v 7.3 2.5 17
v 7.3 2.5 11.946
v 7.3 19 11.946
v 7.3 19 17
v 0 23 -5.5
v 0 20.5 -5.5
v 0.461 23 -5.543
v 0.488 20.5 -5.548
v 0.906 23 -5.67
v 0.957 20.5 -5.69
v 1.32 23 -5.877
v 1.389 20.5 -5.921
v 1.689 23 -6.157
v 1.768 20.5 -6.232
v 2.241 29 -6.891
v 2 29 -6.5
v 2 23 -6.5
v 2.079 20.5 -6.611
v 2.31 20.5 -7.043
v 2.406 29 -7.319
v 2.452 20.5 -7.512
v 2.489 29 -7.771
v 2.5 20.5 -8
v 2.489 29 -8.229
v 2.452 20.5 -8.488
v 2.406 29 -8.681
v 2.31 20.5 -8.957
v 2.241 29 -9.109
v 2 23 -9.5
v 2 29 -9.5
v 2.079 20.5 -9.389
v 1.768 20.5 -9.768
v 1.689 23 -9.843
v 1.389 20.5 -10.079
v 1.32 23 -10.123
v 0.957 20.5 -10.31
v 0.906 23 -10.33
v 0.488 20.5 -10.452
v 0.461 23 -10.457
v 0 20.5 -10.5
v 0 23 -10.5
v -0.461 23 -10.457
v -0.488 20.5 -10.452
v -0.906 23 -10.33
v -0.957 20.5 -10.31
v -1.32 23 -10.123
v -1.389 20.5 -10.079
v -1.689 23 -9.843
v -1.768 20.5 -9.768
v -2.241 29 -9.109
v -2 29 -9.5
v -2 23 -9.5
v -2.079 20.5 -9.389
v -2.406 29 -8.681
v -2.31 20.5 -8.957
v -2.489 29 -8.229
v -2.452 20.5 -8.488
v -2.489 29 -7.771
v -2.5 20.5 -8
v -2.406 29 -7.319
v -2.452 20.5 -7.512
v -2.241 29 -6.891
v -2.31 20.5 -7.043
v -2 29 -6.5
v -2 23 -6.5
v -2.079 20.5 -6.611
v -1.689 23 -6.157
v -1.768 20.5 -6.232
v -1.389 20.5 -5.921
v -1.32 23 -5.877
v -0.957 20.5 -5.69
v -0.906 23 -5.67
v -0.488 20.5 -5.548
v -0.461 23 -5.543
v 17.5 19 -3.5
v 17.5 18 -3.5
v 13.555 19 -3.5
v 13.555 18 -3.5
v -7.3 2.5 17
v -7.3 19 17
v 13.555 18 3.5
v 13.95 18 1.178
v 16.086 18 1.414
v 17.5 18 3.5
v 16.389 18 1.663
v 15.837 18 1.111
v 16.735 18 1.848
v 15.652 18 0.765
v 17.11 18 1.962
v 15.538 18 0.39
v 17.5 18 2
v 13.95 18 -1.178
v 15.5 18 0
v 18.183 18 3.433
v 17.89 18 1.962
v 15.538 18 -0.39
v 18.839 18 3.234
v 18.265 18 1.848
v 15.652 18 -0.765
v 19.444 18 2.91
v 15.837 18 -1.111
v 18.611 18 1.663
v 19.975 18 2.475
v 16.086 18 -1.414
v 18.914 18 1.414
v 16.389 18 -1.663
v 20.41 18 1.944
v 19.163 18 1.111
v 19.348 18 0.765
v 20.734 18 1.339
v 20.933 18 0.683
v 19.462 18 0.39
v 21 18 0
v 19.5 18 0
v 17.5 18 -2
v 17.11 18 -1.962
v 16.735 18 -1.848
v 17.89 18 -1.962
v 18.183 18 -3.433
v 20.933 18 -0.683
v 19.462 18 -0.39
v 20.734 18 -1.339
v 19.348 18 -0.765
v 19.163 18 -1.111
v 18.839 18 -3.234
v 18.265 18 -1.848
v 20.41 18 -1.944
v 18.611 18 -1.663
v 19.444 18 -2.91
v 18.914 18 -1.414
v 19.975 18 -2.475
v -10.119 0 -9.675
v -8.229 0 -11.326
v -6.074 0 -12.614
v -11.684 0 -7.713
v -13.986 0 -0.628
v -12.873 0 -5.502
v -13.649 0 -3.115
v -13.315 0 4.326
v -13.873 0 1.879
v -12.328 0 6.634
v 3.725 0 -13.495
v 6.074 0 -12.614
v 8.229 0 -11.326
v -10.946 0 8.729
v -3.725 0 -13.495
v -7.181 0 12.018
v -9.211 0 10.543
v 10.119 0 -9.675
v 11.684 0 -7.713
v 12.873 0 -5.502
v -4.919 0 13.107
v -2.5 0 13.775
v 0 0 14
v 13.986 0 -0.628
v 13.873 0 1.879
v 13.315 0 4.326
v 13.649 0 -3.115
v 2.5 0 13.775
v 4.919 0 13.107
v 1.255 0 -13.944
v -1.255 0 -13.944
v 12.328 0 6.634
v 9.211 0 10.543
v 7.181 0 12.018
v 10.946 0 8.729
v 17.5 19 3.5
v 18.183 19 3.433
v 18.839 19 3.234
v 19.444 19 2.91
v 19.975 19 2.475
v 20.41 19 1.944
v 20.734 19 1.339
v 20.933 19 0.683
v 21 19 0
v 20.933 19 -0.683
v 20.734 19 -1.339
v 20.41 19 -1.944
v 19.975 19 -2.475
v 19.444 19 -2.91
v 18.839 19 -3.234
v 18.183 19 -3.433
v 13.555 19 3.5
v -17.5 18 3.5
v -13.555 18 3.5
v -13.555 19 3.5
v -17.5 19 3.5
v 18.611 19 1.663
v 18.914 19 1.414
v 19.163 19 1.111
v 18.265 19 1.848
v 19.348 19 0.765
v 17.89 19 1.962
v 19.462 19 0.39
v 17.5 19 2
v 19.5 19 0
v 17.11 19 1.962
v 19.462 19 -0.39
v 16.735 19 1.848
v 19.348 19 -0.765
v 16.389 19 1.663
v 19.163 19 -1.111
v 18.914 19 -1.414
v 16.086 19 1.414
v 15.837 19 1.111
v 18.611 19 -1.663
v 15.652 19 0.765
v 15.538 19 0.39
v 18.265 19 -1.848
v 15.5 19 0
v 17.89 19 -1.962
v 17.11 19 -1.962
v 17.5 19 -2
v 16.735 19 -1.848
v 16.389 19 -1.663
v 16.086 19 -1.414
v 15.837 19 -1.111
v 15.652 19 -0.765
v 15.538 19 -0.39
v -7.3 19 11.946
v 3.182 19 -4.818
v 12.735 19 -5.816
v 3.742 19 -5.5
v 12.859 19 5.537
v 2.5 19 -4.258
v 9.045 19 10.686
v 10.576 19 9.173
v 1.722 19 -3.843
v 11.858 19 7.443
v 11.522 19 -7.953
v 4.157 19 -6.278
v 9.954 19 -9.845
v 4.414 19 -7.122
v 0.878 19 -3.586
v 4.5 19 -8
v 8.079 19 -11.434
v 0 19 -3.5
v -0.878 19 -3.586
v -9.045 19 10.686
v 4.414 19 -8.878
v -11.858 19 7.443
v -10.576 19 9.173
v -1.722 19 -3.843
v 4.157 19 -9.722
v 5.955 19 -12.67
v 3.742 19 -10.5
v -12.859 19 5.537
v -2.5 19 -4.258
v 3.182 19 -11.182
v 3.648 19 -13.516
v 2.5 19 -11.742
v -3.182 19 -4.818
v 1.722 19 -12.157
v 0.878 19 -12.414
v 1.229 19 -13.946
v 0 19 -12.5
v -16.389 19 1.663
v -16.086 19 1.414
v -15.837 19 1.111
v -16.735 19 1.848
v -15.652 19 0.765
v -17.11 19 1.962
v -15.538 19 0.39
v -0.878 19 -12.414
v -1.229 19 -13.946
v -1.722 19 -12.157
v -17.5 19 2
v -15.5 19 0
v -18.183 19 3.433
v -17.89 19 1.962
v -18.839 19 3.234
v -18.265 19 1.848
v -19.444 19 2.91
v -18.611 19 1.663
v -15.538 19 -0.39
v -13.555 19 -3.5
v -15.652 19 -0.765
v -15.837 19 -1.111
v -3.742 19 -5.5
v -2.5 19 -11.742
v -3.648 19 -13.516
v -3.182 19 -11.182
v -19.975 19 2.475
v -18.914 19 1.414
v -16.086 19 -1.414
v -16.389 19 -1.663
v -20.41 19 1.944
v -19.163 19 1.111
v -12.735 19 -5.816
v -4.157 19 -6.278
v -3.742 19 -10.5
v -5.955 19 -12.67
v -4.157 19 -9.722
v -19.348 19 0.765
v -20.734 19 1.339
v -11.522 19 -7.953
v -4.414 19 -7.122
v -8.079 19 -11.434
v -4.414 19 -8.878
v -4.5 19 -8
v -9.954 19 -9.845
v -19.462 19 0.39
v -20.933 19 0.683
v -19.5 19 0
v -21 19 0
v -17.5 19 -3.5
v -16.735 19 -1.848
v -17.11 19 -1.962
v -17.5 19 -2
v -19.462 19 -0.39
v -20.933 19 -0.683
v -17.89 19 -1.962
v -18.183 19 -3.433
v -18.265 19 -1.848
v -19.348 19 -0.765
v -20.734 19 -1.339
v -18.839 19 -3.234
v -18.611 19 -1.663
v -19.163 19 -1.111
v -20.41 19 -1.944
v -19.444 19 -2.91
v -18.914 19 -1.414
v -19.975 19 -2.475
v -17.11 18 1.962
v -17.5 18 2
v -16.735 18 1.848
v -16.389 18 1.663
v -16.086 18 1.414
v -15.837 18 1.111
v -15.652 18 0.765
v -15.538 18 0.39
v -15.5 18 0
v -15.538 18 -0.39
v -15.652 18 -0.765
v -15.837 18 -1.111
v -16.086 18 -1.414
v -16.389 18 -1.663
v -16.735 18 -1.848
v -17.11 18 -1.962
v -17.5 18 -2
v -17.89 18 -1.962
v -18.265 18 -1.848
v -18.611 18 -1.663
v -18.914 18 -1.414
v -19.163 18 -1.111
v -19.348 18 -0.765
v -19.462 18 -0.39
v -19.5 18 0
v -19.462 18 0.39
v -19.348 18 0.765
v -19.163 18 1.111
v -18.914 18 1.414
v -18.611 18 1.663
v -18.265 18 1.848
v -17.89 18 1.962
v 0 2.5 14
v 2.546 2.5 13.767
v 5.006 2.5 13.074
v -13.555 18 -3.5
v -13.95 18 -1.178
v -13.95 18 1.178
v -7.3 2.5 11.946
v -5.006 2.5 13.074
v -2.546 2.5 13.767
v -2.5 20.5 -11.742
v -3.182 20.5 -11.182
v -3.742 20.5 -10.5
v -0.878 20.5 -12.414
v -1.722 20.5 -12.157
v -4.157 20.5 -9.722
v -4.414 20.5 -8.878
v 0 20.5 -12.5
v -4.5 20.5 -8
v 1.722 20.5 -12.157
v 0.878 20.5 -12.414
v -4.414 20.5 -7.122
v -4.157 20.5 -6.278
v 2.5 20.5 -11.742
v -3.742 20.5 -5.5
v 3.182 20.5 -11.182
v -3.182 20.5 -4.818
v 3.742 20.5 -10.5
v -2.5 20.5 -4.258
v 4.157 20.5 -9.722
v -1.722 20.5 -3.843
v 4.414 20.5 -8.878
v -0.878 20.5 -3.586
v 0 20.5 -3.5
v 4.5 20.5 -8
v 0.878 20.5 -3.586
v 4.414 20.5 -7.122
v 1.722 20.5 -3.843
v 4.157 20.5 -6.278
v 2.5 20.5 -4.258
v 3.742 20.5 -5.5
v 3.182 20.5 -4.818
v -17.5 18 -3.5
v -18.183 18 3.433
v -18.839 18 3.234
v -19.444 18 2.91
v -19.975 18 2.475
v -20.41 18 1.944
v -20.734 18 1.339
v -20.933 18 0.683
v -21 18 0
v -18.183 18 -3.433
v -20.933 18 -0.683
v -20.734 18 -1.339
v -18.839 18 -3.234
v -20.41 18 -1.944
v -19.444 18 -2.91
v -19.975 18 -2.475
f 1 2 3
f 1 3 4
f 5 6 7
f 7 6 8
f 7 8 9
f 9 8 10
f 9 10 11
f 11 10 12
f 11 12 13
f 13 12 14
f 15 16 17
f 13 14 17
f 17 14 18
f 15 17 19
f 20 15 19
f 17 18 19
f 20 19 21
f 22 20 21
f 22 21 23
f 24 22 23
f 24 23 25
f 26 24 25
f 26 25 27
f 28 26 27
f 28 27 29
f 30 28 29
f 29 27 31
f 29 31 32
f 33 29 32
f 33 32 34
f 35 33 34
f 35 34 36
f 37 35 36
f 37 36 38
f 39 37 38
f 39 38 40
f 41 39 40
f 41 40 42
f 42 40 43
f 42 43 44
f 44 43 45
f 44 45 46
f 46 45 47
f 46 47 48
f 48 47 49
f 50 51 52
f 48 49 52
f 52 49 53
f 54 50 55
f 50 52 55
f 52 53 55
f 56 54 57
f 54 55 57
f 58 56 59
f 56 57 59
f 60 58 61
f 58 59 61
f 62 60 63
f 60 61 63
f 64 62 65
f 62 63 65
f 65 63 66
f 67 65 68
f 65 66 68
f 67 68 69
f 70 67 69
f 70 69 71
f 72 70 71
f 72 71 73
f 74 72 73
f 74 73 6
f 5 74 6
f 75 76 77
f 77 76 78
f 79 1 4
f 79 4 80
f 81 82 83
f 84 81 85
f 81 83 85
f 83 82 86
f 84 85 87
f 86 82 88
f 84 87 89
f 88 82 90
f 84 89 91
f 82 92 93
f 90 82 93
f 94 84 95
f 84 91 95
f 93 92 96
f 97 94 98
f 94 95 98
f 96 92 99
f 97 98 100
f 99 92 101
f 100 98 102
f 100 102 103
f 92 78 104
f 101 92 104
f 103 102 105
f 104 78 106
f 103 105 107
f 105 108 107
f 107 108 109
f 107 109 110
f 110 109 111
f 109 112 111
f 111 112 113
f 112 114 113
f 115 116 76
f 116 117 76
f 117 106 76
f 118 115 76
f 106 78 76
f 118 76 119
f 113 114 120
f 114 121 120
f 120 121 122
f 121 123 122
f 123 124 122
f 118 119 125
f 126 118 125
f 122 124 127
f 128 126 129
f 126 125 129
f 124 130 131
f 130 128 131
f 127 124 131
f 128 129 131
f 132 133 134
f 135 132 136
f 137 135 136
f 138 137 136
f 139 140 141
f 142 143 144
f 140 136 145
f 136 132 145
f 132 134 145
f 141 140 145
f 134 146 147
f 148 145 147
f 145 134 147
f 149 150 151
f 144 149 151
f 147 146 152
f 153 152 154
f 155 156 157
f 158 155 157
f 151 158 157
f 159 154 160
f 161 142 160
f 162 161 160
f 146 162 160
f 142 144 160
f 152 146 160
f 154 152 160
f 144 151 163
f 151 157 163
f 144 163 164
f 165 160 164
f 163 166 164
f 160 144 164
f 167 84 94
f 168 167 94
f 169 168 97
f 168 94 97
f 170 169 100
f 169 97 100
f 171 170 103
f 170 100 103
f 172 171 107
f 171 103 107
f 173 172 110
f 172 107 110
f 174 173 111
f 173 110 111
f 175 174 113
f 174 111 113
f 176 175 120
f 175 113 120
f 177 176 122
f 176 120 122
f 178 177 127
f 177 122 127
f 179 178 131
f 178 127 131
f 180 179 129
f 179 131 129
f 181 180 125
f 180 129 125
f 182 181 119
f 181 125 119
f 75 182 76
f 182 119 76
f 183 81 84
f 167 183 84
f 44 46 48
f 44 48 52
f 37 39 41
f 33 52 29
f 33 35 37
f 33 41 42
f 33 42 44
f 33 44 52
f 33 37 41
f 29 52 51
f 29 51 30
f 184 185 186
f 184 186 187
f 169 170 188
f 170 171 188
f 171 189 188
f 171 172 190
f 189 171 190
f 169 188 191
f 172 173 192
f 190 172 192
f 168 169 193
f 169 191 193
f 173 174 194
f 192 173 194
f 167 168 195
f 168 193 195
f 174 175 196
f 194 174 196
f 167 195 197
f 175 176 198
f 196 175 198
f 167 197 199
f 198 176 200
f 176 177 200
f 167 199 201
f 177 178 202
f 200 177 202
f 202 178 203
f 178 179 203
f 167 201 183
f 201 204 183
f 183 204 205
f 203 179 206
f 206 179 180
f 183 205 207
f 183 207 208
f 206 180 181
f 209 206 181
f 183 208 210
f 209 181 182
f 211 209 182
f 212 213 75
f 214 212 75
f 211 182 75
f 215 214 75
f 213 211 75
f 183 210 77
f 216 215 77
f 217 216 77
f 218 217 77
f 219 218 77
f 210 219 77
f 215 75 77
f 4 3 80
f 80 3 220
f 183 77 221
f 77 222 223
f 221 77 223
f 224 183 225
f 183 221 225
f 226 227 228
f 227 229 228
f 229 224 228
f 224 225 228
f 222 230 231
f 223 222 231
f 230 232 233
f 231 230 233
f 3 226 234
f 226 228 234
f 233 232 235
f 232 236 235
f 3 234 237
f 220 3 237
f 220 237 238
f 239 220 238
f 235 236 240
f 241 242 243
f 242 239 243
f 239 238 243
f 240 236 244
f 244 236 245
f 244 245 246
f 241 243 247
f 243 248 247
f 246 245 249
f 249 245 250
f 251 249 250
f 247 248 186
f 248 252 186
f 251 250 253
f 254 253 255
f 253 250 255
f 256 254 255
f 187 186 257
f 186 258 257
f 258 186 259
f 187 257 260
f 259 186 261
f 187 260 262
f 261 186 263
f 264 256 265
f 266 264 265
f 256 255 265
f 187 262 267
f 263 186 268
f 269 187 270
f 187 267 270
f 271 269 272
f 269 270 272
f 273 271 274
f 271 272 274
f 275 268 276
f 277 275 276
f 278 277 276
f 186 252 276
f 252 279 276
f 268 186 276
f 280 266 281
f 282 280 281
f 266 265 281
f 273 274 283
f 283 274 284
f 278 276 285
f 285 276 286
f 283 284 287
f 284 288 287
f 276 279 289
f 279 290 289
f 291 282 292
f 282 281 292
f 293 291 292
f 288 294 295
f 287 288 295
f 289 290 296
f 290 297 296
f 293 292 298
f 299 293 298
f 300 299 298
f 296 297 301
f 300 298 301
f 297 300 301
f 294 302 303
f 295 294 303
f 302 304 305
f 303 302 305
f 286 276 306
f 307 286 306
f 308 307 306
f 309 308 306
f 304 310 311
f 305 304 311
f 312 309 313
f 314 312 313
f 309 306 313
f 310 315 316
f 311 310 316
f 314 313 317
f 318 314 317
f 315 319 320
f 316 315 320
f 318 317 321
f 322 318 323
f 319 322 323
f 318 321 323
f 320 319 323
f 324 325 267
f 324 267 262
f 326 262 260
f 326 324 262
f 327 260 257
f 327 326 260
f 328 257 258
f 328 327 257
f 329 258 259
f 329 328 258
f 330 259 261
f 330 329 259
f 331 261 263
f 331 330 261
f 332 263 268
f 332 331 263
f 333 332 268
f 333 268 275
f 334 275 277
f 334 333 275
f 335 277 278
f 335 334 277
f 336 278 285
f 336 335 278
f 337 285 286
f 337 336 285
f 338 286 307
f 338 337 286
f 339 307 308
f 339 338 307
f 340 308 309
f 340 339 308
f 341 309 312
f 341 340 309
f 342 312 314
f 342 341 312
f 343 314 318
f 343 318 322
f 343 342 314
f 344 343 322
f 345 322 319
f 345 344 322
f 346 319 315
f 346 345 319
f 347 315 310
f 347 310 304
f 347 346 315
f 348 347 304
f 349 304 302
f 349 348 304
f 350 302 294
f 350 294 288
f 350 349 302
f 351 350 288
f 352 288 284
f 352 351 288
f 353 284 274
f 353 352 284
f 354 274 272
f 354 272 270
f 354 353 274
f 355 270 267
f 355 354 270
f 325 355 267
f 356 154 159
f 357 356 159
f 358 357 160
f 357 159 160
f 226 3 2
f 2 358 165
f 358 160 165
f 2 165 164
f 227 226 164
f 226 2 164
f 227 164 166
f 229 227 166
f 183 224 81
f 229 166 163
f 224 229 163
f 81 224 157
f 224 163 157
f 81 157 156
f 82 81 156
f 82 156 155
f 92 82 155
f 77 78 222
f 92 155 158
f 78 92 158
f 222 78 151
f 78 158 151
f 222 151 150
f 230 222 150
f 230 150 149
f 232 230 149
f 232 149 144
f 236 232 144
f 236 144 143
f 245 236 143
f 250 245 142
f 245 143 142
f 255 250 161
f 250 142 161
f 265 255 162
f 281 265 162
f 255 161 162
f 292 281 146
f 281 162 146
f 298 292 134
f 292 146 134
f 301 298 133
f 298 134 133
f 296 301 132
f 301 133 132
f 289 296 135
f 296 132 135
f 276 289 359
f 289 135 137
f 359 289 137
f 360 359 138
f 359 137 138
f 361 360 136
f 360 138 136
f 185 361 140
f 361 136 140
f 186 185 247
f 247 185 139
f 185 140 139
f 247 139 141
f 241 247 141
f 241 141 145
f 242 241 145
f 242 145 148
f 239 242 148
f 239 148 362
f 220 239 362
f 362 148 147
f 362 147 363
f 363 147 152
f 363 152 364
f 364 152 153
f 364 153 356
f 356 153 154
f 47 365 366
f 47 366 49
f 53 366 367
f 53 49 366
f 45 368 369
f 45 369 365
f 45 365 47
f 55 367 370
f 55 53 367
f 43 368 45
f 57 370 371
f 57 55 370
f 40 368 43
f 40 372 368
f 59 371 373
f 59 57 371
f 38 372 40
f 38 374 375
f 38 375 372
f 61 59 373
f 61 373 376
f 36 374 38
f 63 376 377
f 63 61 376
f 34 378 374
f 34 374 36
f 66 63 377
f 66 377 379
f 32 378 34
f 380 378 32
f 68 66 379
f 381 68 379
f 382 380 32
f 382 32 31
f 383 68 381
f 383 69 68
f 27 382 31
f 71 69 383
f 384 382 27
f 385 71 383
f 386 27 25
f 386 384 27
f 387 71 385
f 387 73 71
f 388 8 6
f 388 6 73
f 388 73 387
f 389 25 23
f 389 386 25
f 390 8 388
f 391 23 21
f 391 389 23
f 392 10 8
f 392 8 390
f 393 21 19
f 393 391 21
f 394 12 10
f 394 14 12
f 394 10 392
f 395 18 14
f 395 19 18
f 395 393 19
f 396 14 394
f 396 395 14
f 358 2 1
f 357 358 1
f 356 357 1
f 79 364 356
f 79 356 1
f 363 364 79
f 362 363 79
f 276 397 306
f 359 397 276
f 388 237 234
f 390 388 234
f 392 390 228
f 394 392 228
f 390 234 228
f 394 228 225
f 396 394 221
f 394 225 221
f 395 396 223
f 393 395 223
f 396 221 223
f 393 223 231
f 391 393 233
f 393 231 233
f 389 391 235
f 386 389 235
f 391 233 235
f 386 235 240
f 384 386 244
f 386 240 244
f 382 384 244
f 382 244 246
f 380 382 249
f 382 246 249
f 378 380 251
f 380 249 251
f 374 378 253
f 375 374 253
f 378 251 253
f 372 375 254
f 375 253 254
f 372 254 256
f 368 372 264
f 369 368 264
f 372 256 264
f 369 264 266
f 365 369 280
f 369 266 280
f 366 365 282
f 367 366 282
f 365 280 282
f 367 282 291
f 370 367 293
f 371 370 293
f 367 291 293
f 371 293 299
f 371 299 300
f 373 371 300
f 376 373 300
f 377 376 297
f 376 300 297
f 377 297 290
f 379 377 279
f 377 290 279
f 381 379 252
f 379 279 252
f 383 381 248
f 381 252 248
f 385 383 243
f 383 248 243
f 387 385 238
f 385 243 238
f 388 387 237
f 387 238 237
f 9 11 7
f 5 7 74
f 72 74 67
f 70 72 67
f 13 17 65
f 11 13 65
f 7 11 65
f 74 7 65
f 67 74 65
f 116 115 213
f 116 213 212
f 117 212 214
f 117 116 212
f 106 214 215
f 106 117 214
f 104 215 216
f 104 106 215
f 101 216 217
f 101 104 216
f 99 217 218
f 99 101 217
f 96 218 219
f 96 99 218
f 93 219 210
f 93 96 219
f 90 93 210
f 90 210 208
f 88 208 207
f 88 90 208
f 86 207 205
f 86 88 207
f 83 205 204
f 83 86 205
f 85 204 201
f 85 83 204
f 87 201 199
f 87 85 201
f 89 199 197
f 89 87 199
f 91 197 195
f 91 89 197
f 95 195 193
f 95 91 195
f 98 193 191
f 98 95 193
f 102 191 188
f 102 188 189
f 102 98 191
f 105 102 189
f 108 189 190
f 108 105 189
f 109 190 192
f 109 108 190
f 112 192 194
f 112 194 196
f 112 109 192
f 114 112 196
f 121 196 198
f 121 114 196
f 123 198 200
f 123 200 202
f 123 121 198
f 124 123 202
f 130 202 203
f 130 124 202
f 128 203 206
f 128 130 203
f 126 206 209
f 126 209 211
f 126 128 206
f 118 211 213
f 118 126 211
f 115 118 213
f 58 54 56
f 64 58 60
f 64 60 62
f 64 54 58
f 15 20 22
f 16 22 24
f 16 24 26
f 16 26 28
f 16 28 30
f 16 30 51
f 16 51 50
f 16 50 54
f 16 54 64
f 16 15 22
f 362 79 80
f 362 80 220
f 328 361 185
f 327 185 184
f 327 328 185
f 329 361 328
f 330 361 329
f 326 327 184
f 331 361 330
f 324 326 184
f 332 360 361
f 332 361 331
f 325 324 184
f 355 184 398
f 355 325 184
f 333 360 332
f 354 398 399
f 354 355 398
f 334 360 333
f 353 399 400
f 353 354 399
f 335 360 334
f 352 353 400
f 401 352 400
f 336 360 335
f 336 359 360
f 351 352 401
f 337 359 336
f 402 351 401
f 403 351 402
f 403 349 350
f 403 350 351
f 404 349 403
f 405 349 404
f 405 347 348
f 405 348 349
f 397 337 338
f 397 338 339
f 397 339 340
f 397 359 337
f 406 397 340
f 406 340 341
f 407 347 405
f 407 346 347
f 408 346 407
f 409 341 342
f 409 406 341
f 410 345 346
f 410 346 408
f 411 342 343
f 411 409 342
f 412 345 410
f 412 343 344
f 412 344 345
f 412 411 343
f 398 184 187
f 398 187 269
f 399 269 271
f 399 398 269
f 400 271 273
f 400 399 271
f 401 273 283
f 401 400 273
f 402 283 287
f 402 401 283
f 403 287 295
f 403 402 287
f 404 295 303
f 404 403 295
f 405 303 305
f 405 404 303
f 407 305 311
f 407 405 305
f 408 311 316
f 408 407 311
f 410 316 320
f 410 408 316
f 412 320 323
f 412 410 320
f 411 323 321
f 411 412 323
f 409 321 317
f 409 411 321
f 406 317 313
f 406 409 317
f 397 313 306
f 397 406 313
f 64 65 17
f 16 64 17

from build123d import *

# Parameters (mm, degrees)
SKETCH_1_R          = 14
EXTRUDE_1_DEPTH     = 19
SKETCH_2_R          = 4.5
EXTRUDE_2_DEPTH     = 1.5
SKETCH_3_R          = 2.5
EXTRUDE_3_DEPTH     = 8.5
CUT_EXTRUDE_START   = -6
CUT_EXTRUDE_1_DEPTH = 6
EXTRUDE_START       = -1
SKETCH_5_R          = 2
EXTRUDE_4_DEPTH     = 1
EXTRUDE_START_2     = -16.5
EXTRUDE_5_DEPTH     = 16.5


with BuildPart() as part:
    # Эскиз1 → Бобышка-Вытянуть1 (new body)
    with BuildSketch(Plane(origin=(0, 0, 0), x_dir=(1, 0, 0), z_dir=(0, 1, 0))):
        with Locations(Location((0, 0, 0), (0, 0, 270))):
            Circle(SKETCH_1_R)
    extrude(amount=EXTRUDE_1_DEPTH)

    # Эскиз2 → Бобышка-Вытянуть2 (add)
    with BuildSketch(Plane(origin=(0, 19, 0), x_dir=(1, 0, 0), z_dir=(0, 1, 0))):
        with Locations(Location((0, 8, 0), (0, 0, 270))):
            Circle(SKETCH_2_R)
    extrude(amount=EXTRUDE_2_DEPTH)

    # Эскиз3 → Бобышка-Вытянуть3 (add)
    with BuildSketch(Plane(origin=(0, 20.5, 0), x_dir=(1, 0, 0), z_dir=(0, 1, 0))):
        with Locations(Location((0, 8, 0), (0, 0, 270))):
            Circle(SKETCH_3_R)
    extrude(amount=EXTRUDE_3_DEPTH)

    # Эскиз4 → Вырез-Вытянуть1 (cut)
    with BuildSketch(Plane(origin=(0, 29, 0), x_dir=(1, 0, 0), z_dir=(0, 1, 0)).offset(CUT_EXTRUDE_START)):
        with BuildLine():
            Line((-2, 9.5), (2, 9.5))
            ThreePointArc((2, 9.5), (0, 10.5), (-2, 9.5))
        make_face()
        with BuildLine():
            Line((-2, 6.5), (2, 6.5))
            ThreePointArc((2, 6.5), (0, 5.5), (-2, 6.5))
        make_face()
    extrude(amount=CUT_EXTRUDE_1_DEPTH, mode=Mode.SUBTRACT)

    # Эскиз5 → Бобышка-Вытянуть4 (add)
    # profile 1 of 2: a face of its own
    with BuildSketch(Plane(origin=(0, 19, 0), x_dir=(1, 0, 0), z_dir=(0, 1, 0)).offset(EXTRUDE_START)):
        with BuildLine():
            Line((-17.5, 3.5), (-13.555441712, 3.5))
            ThreePointArc((-13.555441712, 3.5), (-14, 0), (-13.555441712, -3.5))
            Line((-13.555441712, -3.5), (-17.5, -3.5))
            ThreePointArc((-17.5, -3.5), (-21, 0), (-17.5, 3.5))
        make_face()
        with Locations(Location((-17.5, 0, 0), (0, 0, 270))):
            Circle(SKETCH_5_R, mode=Mode.SUBTRACT)
    # profile 2 of 2: a face of its own
    with BuildSketch(Plane(origin=(0, 19, 0), x_dir=(1, 0, 0), z_dir=(0, 1, 0)).offset(EXTRUDE_START)):
        with BuildLine():
            Line((17.5, 3.5), (13.555441712, 3.5))
            ThreePointArc((13.555441712, 3.5), (14, 0), (13.555441712, -3.5))
            Line((13.555441712, -3.5), (17.5, -3.5))
            ThreePointArc((17.5, -3.5), (21, 0), (17.5, 3.5))
        make_face()
        with Locations(Location((17.5, 0, 0), (0, 0, 90))):
            Circle(SKETCH_5_R, mode=Mode.SUBTRACT)
    extrude(amount=EXTRUDE_4_DEPTH)

    # Эскиз6 → Бобышка-Вытянуть5 (add)
    with BuildSketch(Plane(origin=(0, 19, 0), x_dir=(1, 0, 0), z_dir=(0, 1, 0)).offset(EXTRUDE_START_2)):
        with BuildLine():
            Line((7.3, -17), (-7.3, -17))
            Line((-7.3, -17), (-7.3, -11.94612908))
            ThreePointArc((-7.3, -11.94612908), (0, -14), (7.3, -11.94612908))
            Line((7.3, -11.94612908), (7.3, -17))
        make_face()
    extrude(amount=EXTRUDE_5_DEPTH)


solid = part.part
